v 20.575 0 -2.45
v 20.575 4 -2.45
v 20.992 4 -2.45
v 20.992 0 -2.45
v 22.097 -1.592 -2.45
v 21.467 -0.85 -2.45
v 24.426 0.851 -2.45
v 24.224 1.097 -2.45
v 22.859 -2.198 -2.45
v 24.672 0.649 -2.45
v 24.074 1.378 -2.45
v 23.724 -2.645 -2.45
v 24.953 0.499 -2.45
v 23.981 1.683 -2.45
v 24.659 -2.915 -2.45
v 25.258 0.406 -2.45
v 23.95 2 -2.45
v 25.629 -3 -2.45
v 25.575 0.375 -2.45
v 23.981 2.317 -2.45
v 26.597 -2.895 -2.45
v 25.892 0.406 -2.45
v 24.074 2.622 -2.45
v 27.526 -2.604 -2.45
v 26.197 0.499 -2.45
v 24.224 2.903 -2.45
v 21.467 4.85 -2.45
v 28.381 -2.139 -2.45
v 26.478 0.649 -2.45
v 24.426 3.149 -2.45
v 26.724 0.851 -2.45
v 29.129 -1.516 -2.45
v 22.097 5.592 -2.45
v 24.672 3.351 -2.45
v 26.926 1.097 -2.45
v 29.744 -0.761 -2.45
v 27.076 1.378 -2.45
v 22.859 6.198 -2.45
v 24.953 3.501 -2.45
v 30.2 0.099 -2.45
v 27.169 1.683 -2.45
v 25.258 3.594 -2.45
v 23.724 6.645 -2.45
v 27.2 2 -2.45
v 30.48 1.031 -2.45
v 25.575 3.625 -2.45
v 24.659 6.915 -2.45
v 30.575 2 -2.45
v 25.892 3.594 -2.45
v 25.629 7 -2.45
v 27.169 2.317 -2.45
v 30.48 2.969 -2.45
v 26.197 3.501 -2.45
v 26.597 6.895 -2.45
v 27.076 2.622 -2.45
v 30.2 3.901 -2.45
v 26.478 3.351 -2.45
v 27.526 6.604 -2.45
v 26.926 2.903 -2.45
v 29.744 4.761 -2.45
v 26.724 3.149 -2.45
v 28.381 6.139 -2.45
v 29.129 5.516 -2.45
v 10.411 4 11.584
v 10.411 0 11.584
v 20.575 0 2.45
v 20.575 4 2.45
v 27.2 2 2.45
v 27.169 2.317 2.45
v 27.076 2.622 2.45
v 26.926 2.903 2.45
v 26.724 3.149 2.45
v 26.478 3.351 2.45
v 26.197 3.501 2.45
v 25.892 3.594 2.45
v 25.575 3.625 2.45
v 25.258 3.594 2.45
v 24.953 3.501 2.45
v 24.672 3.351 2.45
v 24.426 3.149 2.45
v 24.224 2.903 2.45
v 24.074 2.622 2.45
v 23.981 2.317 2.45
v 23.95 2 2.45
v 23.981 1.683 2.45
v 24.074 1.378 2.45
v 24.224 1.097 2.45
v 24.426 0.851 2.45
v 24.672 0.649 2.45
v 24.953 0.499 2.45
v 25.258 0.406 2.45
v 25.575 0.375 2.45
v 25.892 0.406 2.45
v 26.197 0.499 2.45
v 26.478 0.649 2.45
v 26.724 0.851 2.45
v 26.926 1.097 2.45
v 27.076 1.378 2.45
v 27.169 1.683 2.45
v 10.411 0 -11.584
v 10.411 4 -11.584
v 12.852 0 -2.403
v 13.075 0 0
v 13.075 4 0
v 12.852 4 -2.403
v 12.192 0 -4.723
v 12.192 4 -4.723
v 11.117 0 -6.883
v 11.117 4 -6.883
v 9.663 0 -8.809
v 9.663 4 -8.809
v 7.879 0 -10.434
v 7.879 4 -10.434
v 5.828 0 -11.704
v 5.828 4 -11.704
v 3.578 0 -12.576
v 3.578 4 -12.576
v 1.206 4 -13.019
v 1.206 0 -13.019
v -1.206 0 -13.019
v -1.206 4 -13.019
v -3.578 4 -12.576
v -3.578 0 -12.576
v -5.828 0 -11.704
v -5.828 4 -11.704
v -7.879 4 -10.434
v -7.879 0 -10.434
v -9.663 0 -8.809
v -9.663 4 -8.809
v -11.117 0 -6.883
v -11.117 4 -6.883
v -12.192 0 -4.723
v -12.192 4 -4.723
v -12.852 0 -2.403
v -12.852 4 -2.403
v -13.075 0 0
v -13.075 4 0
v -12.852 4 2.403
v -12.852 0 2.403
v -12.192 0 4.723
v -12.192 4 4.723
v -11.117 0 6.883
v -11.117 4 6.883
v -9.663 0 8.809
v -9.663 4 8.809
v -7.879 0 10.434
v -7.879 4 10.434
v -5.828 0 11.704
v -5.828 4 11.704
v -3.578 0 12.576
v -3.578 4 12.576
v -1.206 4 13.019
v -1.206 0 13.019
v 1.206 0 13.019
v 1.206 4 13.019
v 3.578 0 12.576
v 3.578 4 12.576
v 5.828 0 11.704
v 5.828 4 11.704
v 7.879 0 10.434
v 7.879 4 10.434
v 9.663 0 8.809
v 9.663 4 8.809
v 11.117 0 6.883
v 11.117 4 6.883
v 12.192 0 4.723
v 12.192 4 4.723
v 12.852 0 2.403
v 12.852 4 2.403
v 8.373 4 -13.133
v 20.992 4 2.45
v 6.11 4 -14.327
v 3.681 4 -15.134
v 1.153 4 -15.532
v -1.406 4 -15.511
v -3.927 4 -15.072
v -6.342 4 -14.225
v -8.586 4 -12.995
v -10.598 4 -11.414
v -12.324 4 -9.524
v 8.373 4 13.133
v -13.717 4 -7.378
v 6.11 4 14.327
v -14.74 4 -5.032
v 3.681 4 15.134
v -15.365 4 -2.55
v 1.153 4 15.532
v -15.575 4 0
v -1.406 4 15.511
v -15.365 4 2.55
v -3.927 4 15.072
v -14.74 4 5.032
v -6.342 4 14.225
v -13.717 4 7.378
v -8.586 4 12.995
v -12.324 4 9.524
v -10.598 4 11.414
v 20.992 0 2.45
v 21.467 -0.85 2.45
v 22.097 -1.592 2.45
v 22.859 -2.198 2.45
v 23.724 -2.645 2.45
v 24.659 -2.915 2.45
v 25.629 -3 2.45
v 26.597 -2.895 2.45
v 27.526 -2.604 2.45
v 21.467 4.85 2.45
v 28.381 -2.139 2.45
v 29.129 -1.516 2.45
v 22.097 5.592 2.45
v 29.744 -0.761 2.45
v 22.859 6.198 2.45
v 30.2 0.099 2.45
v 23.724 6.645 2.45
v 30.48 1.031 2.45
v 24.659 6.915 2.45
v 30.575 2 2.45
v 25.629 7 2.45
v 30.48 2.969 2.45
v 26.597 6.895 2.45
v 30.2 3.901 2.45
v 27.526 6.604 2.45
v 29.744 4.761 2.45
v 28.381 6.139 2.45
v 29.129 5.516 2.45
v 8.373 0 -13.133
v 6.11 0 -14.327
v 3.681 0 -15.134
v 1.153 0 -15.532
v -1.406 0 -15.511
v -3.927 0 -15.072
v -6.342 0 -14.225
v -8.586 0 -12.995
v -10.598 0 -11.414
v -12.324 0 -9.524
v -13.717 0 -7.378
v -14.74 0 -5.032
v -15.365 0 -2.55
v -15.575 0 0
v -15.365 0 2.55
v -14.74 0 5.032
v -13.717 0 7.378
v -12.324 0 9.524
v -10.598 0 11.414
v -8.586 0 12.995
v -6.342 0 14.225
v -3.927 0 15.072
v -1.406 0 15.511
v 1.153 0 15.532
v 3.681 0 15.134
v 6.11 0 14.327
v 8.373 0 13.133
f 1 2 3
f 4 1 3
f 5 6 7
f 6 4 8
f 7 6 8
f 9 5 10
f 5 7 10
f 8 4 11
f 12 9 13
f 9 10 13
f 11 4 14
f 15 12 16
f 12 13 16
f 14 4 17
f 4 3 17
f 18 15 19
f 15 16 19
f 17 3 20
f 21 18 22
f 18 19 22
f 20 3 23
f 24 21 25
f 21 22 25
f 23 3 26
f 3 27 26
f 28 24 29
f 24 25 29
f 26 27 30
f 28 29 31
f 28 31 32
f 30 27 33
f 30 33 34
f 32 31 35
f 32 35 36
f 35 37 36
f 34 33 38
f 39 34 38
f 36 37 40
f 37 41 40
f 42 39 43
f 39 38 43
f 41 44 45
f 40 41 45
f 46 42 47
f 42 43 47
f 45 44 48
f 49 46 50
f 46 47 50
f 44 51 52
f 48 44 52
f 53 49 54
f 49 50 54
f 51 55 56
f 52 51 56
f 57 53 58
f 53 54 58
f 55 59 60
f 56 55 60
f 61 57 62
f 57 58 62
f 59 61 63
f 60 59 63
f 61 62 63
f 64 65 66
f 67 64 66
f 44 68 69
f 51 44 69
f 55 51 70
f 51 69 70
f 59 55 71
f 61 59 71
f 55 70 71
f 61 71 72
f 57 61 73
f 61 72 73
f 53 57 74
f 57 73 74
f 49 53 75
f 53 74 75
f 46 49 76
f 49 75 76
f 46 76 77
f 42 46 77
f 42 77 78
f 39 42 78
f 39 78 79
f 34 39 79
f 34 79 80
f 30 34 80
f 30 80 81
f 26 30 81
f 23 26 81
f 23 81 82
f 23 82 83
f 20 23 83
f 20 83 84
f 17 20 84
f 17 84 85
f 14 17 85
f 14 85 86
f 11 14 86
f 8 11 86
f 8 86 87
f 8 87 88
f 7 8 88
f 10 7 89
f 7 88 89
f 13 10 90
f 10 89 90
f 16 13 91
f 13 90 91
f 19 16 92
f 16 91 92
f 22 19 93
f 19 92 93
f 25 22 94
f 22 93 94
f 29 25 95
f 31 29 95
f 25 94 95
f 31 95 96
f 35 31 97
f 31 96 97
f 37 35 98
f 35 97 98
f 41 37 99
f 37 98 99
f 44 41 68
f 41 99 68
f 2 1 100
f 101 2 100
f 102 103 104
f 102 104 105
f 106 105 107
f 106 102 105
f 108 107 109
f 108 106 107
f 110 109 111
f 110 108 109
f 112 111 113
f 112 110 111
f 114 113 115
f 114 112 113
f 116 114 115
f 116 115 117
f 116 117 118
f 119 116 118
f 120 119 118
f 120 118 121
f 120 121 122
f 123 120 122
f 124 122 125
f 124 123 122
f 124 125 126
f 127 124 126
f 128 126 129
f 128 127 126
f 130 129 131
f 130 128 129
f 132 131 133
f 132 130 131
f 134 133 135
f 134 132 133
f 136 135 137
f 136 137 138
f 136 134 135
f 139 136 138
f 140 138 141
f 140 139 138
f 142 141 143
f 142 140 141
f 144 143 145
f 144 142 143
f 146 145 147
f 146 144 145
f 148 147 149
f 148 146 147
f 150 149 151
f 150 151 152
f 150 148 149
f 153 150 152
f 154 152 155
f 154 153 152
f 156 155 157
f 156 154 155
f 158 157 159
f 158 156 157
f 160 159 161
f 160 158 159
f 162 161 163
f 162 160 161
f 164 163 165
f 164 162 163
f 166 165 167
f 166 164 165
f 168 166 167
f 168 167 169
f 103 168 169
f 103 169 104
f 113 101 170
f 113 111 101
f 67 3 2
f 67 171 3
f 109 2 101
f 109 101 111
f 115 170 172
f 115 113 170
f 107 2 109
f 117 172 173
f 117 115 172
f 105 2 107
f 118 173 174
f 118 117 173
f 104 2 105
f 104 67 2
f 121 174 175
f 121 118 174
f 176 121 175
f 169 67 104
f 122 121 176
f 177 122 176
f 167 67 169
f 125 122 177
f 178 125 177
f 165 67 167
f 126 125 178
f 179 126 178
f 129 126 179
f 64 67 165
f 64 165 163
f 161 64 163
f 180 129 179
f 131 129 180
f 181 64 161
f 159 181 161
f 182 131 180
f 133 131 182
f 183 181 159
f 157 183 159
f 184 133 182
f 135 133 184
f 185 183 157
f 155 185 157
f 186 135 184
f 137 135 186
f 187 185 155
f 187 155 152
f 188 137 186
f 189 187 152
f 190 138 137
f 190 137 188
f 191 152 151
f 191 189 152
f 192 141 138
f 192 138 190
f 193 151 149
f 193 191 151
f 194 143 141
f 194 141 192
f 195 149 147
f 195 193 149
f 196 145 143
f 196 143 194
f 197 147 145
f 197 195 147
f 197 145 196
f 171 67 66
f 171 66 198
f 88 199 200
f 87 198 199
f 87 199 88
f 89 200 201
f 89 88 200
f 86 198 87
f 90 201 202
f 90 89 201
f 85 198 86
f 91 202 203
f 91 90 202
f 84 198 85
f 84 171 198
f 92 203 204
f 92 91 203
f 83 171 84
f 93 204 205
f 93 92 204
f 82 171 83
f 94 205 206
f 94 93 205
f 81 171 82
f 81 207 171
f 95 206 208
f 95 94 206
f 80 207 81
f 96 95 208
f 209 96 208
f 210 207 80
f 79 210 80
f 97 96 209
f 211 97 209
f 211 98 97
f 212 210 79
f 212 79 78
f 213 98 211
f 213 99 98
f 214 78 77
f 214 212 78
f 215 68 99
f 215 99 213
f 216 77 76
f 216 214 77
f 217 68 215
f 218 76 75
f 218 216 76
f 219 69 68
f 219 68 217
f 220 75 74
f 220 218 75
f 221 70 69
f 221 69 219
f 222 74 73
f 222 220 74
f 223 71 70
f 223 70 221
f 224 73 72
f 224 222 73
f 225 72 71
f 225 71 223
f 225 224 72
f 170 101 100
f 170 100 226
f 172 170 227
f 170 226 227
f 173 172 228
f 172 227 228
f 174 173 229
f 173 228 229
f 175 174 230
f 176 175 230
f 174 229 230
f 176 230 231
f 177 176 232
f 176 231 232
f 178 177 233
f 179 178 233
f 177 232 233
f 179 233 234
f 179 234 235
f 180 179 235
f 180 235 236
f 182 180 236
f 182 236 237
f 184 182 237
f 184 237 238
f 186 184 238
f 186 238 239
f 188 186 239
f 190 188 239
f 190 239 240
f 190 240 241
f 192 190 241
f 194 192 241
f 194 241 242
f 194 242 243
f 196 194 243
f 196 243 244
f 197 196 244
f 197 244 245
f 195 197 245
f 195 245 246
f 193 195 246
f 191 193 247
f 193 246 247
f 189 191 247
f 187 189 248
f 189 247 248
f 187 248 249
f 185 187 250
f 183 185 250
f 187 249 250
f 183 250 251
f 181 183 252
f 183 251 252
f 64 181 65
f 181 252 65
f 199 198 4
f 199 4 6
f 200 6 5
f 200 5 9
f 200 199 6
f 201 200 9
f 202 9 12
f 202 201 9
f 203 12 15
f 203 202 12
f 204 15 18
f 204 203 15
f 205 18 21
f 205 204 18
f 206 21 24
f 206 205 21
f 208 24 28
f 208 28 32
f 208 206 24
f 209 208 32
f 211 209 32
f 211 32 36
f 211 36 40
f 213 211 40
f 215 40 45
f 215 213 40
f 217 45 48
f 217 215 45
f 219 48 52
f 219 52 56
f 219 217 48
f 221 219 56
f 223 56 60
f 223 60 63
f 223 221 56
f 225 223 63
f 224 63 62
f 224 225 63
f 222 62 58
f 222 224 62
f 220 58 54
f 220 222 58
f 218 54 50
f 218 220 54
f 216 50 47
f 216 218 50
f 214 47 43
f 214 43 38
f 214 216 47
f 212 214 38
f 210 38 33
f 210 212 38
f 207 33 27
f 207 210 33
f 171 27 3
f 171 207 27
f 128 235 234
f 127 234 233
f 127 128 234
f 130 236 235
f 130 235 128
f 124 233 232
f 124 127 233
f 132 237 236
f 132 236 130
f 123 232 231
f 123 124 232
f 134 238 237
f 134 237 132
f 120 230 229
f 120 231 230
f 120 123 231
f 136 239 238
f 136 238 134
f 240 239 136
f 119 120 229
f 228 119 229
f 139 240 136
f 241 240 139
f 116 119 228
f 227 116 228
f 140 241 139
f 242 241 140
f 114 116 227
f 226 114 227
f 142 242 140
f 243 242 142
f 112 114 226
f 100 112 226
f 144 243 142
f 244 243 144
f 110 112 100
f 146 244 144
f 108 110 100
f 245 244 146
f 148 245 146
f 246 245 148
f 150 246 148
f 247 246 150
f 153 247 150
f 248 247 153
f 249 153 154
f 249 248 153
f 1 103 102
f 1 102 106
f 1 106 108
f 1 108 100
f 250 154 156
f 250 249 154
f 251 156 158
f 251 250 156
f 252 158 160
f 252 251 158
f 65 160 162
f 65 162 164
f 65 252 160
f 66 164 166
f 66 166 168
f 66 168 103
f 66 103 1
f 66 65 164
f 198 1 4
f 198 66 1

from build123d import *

# Parameters (mm, degrees)
CROQUIS1_R              = 15.575
CROQUIS1_R_2            = 13.075
SALIENTE_EXTRUIR1_DEPTH = 4
SALIENTE_EXTRUIR2_DEPTH = 4
SALIENTE_EXTRUIR3_DEPTH = 2.45
CROQUIS4_R              = 1.625
CORTAR_EXTRUIR1_DEPTH   = 19.025


with BuildPart() as part:
    # Croquis1 → Saliente-Extruir1 (new body)
    with BuildSketch(Plane(origin=(0, 0, 0), x_dir=(1, 0, 0), z_dir=(0, 1, 0))):
        Circle(CROQUIS1_R)
        Circle(CROQUIS1_R_2, mode=Mode.SUBTRACT)
    extrude(amount=SALIENTE_EXTRUIR1_DEPTH)

    # Croquis2 → Saliente-Extruir2 (add)
    with BuildSketch(Plane(origin=(0, 0, 0), x_dir=(1, 0, 0), z_dir=(0, 1, 0))):
        with BuildLine():
            Line((20.575, 2.45), (10.410630983, 11.584445932))
            ThreePointArc((10.410630983, 11.584445932), (15.575, 0), (10.410630983, -11.584445932))
            Line((10.410630983, -11.584445932), (20.575, -2.45))
            Line((20.575, -2.45), (20.575, 2.45))
        make_face()
    extrude(amount=SALIENTE_EXTRUIR2_DEPTH)

    # Croquis3 → Saliente-Extruir3 (add, symmetric)
    with BuildSketch(Plane.XY):
        with BuildLine():
            Line((20.575, 4), (20.575, 0))
            Line((20.575, 0), (20.992424305, 0))
            ThreePointArc((20.992424305, 0), (30.575, 2), (20.992424305, 4))
            Line((20.992424305, 4), (20.575, 4))
        make_face()
    extrude(amount=SALIENTE_EXTRUIR3_DEPTH, both=True)

    # Croquis4 → Cortar-Extruir1 (cut, through all)
    with BuildSketch(Plane.XY.offset(2.45)):
        with Locations((25.575, 2)):
            Circle(CROQUIS4_R)
    extrude(amount=-CORTAR_EXTRUIR1_DEPTH, mode=Mode.SUBTRACT)


solid = part.part
